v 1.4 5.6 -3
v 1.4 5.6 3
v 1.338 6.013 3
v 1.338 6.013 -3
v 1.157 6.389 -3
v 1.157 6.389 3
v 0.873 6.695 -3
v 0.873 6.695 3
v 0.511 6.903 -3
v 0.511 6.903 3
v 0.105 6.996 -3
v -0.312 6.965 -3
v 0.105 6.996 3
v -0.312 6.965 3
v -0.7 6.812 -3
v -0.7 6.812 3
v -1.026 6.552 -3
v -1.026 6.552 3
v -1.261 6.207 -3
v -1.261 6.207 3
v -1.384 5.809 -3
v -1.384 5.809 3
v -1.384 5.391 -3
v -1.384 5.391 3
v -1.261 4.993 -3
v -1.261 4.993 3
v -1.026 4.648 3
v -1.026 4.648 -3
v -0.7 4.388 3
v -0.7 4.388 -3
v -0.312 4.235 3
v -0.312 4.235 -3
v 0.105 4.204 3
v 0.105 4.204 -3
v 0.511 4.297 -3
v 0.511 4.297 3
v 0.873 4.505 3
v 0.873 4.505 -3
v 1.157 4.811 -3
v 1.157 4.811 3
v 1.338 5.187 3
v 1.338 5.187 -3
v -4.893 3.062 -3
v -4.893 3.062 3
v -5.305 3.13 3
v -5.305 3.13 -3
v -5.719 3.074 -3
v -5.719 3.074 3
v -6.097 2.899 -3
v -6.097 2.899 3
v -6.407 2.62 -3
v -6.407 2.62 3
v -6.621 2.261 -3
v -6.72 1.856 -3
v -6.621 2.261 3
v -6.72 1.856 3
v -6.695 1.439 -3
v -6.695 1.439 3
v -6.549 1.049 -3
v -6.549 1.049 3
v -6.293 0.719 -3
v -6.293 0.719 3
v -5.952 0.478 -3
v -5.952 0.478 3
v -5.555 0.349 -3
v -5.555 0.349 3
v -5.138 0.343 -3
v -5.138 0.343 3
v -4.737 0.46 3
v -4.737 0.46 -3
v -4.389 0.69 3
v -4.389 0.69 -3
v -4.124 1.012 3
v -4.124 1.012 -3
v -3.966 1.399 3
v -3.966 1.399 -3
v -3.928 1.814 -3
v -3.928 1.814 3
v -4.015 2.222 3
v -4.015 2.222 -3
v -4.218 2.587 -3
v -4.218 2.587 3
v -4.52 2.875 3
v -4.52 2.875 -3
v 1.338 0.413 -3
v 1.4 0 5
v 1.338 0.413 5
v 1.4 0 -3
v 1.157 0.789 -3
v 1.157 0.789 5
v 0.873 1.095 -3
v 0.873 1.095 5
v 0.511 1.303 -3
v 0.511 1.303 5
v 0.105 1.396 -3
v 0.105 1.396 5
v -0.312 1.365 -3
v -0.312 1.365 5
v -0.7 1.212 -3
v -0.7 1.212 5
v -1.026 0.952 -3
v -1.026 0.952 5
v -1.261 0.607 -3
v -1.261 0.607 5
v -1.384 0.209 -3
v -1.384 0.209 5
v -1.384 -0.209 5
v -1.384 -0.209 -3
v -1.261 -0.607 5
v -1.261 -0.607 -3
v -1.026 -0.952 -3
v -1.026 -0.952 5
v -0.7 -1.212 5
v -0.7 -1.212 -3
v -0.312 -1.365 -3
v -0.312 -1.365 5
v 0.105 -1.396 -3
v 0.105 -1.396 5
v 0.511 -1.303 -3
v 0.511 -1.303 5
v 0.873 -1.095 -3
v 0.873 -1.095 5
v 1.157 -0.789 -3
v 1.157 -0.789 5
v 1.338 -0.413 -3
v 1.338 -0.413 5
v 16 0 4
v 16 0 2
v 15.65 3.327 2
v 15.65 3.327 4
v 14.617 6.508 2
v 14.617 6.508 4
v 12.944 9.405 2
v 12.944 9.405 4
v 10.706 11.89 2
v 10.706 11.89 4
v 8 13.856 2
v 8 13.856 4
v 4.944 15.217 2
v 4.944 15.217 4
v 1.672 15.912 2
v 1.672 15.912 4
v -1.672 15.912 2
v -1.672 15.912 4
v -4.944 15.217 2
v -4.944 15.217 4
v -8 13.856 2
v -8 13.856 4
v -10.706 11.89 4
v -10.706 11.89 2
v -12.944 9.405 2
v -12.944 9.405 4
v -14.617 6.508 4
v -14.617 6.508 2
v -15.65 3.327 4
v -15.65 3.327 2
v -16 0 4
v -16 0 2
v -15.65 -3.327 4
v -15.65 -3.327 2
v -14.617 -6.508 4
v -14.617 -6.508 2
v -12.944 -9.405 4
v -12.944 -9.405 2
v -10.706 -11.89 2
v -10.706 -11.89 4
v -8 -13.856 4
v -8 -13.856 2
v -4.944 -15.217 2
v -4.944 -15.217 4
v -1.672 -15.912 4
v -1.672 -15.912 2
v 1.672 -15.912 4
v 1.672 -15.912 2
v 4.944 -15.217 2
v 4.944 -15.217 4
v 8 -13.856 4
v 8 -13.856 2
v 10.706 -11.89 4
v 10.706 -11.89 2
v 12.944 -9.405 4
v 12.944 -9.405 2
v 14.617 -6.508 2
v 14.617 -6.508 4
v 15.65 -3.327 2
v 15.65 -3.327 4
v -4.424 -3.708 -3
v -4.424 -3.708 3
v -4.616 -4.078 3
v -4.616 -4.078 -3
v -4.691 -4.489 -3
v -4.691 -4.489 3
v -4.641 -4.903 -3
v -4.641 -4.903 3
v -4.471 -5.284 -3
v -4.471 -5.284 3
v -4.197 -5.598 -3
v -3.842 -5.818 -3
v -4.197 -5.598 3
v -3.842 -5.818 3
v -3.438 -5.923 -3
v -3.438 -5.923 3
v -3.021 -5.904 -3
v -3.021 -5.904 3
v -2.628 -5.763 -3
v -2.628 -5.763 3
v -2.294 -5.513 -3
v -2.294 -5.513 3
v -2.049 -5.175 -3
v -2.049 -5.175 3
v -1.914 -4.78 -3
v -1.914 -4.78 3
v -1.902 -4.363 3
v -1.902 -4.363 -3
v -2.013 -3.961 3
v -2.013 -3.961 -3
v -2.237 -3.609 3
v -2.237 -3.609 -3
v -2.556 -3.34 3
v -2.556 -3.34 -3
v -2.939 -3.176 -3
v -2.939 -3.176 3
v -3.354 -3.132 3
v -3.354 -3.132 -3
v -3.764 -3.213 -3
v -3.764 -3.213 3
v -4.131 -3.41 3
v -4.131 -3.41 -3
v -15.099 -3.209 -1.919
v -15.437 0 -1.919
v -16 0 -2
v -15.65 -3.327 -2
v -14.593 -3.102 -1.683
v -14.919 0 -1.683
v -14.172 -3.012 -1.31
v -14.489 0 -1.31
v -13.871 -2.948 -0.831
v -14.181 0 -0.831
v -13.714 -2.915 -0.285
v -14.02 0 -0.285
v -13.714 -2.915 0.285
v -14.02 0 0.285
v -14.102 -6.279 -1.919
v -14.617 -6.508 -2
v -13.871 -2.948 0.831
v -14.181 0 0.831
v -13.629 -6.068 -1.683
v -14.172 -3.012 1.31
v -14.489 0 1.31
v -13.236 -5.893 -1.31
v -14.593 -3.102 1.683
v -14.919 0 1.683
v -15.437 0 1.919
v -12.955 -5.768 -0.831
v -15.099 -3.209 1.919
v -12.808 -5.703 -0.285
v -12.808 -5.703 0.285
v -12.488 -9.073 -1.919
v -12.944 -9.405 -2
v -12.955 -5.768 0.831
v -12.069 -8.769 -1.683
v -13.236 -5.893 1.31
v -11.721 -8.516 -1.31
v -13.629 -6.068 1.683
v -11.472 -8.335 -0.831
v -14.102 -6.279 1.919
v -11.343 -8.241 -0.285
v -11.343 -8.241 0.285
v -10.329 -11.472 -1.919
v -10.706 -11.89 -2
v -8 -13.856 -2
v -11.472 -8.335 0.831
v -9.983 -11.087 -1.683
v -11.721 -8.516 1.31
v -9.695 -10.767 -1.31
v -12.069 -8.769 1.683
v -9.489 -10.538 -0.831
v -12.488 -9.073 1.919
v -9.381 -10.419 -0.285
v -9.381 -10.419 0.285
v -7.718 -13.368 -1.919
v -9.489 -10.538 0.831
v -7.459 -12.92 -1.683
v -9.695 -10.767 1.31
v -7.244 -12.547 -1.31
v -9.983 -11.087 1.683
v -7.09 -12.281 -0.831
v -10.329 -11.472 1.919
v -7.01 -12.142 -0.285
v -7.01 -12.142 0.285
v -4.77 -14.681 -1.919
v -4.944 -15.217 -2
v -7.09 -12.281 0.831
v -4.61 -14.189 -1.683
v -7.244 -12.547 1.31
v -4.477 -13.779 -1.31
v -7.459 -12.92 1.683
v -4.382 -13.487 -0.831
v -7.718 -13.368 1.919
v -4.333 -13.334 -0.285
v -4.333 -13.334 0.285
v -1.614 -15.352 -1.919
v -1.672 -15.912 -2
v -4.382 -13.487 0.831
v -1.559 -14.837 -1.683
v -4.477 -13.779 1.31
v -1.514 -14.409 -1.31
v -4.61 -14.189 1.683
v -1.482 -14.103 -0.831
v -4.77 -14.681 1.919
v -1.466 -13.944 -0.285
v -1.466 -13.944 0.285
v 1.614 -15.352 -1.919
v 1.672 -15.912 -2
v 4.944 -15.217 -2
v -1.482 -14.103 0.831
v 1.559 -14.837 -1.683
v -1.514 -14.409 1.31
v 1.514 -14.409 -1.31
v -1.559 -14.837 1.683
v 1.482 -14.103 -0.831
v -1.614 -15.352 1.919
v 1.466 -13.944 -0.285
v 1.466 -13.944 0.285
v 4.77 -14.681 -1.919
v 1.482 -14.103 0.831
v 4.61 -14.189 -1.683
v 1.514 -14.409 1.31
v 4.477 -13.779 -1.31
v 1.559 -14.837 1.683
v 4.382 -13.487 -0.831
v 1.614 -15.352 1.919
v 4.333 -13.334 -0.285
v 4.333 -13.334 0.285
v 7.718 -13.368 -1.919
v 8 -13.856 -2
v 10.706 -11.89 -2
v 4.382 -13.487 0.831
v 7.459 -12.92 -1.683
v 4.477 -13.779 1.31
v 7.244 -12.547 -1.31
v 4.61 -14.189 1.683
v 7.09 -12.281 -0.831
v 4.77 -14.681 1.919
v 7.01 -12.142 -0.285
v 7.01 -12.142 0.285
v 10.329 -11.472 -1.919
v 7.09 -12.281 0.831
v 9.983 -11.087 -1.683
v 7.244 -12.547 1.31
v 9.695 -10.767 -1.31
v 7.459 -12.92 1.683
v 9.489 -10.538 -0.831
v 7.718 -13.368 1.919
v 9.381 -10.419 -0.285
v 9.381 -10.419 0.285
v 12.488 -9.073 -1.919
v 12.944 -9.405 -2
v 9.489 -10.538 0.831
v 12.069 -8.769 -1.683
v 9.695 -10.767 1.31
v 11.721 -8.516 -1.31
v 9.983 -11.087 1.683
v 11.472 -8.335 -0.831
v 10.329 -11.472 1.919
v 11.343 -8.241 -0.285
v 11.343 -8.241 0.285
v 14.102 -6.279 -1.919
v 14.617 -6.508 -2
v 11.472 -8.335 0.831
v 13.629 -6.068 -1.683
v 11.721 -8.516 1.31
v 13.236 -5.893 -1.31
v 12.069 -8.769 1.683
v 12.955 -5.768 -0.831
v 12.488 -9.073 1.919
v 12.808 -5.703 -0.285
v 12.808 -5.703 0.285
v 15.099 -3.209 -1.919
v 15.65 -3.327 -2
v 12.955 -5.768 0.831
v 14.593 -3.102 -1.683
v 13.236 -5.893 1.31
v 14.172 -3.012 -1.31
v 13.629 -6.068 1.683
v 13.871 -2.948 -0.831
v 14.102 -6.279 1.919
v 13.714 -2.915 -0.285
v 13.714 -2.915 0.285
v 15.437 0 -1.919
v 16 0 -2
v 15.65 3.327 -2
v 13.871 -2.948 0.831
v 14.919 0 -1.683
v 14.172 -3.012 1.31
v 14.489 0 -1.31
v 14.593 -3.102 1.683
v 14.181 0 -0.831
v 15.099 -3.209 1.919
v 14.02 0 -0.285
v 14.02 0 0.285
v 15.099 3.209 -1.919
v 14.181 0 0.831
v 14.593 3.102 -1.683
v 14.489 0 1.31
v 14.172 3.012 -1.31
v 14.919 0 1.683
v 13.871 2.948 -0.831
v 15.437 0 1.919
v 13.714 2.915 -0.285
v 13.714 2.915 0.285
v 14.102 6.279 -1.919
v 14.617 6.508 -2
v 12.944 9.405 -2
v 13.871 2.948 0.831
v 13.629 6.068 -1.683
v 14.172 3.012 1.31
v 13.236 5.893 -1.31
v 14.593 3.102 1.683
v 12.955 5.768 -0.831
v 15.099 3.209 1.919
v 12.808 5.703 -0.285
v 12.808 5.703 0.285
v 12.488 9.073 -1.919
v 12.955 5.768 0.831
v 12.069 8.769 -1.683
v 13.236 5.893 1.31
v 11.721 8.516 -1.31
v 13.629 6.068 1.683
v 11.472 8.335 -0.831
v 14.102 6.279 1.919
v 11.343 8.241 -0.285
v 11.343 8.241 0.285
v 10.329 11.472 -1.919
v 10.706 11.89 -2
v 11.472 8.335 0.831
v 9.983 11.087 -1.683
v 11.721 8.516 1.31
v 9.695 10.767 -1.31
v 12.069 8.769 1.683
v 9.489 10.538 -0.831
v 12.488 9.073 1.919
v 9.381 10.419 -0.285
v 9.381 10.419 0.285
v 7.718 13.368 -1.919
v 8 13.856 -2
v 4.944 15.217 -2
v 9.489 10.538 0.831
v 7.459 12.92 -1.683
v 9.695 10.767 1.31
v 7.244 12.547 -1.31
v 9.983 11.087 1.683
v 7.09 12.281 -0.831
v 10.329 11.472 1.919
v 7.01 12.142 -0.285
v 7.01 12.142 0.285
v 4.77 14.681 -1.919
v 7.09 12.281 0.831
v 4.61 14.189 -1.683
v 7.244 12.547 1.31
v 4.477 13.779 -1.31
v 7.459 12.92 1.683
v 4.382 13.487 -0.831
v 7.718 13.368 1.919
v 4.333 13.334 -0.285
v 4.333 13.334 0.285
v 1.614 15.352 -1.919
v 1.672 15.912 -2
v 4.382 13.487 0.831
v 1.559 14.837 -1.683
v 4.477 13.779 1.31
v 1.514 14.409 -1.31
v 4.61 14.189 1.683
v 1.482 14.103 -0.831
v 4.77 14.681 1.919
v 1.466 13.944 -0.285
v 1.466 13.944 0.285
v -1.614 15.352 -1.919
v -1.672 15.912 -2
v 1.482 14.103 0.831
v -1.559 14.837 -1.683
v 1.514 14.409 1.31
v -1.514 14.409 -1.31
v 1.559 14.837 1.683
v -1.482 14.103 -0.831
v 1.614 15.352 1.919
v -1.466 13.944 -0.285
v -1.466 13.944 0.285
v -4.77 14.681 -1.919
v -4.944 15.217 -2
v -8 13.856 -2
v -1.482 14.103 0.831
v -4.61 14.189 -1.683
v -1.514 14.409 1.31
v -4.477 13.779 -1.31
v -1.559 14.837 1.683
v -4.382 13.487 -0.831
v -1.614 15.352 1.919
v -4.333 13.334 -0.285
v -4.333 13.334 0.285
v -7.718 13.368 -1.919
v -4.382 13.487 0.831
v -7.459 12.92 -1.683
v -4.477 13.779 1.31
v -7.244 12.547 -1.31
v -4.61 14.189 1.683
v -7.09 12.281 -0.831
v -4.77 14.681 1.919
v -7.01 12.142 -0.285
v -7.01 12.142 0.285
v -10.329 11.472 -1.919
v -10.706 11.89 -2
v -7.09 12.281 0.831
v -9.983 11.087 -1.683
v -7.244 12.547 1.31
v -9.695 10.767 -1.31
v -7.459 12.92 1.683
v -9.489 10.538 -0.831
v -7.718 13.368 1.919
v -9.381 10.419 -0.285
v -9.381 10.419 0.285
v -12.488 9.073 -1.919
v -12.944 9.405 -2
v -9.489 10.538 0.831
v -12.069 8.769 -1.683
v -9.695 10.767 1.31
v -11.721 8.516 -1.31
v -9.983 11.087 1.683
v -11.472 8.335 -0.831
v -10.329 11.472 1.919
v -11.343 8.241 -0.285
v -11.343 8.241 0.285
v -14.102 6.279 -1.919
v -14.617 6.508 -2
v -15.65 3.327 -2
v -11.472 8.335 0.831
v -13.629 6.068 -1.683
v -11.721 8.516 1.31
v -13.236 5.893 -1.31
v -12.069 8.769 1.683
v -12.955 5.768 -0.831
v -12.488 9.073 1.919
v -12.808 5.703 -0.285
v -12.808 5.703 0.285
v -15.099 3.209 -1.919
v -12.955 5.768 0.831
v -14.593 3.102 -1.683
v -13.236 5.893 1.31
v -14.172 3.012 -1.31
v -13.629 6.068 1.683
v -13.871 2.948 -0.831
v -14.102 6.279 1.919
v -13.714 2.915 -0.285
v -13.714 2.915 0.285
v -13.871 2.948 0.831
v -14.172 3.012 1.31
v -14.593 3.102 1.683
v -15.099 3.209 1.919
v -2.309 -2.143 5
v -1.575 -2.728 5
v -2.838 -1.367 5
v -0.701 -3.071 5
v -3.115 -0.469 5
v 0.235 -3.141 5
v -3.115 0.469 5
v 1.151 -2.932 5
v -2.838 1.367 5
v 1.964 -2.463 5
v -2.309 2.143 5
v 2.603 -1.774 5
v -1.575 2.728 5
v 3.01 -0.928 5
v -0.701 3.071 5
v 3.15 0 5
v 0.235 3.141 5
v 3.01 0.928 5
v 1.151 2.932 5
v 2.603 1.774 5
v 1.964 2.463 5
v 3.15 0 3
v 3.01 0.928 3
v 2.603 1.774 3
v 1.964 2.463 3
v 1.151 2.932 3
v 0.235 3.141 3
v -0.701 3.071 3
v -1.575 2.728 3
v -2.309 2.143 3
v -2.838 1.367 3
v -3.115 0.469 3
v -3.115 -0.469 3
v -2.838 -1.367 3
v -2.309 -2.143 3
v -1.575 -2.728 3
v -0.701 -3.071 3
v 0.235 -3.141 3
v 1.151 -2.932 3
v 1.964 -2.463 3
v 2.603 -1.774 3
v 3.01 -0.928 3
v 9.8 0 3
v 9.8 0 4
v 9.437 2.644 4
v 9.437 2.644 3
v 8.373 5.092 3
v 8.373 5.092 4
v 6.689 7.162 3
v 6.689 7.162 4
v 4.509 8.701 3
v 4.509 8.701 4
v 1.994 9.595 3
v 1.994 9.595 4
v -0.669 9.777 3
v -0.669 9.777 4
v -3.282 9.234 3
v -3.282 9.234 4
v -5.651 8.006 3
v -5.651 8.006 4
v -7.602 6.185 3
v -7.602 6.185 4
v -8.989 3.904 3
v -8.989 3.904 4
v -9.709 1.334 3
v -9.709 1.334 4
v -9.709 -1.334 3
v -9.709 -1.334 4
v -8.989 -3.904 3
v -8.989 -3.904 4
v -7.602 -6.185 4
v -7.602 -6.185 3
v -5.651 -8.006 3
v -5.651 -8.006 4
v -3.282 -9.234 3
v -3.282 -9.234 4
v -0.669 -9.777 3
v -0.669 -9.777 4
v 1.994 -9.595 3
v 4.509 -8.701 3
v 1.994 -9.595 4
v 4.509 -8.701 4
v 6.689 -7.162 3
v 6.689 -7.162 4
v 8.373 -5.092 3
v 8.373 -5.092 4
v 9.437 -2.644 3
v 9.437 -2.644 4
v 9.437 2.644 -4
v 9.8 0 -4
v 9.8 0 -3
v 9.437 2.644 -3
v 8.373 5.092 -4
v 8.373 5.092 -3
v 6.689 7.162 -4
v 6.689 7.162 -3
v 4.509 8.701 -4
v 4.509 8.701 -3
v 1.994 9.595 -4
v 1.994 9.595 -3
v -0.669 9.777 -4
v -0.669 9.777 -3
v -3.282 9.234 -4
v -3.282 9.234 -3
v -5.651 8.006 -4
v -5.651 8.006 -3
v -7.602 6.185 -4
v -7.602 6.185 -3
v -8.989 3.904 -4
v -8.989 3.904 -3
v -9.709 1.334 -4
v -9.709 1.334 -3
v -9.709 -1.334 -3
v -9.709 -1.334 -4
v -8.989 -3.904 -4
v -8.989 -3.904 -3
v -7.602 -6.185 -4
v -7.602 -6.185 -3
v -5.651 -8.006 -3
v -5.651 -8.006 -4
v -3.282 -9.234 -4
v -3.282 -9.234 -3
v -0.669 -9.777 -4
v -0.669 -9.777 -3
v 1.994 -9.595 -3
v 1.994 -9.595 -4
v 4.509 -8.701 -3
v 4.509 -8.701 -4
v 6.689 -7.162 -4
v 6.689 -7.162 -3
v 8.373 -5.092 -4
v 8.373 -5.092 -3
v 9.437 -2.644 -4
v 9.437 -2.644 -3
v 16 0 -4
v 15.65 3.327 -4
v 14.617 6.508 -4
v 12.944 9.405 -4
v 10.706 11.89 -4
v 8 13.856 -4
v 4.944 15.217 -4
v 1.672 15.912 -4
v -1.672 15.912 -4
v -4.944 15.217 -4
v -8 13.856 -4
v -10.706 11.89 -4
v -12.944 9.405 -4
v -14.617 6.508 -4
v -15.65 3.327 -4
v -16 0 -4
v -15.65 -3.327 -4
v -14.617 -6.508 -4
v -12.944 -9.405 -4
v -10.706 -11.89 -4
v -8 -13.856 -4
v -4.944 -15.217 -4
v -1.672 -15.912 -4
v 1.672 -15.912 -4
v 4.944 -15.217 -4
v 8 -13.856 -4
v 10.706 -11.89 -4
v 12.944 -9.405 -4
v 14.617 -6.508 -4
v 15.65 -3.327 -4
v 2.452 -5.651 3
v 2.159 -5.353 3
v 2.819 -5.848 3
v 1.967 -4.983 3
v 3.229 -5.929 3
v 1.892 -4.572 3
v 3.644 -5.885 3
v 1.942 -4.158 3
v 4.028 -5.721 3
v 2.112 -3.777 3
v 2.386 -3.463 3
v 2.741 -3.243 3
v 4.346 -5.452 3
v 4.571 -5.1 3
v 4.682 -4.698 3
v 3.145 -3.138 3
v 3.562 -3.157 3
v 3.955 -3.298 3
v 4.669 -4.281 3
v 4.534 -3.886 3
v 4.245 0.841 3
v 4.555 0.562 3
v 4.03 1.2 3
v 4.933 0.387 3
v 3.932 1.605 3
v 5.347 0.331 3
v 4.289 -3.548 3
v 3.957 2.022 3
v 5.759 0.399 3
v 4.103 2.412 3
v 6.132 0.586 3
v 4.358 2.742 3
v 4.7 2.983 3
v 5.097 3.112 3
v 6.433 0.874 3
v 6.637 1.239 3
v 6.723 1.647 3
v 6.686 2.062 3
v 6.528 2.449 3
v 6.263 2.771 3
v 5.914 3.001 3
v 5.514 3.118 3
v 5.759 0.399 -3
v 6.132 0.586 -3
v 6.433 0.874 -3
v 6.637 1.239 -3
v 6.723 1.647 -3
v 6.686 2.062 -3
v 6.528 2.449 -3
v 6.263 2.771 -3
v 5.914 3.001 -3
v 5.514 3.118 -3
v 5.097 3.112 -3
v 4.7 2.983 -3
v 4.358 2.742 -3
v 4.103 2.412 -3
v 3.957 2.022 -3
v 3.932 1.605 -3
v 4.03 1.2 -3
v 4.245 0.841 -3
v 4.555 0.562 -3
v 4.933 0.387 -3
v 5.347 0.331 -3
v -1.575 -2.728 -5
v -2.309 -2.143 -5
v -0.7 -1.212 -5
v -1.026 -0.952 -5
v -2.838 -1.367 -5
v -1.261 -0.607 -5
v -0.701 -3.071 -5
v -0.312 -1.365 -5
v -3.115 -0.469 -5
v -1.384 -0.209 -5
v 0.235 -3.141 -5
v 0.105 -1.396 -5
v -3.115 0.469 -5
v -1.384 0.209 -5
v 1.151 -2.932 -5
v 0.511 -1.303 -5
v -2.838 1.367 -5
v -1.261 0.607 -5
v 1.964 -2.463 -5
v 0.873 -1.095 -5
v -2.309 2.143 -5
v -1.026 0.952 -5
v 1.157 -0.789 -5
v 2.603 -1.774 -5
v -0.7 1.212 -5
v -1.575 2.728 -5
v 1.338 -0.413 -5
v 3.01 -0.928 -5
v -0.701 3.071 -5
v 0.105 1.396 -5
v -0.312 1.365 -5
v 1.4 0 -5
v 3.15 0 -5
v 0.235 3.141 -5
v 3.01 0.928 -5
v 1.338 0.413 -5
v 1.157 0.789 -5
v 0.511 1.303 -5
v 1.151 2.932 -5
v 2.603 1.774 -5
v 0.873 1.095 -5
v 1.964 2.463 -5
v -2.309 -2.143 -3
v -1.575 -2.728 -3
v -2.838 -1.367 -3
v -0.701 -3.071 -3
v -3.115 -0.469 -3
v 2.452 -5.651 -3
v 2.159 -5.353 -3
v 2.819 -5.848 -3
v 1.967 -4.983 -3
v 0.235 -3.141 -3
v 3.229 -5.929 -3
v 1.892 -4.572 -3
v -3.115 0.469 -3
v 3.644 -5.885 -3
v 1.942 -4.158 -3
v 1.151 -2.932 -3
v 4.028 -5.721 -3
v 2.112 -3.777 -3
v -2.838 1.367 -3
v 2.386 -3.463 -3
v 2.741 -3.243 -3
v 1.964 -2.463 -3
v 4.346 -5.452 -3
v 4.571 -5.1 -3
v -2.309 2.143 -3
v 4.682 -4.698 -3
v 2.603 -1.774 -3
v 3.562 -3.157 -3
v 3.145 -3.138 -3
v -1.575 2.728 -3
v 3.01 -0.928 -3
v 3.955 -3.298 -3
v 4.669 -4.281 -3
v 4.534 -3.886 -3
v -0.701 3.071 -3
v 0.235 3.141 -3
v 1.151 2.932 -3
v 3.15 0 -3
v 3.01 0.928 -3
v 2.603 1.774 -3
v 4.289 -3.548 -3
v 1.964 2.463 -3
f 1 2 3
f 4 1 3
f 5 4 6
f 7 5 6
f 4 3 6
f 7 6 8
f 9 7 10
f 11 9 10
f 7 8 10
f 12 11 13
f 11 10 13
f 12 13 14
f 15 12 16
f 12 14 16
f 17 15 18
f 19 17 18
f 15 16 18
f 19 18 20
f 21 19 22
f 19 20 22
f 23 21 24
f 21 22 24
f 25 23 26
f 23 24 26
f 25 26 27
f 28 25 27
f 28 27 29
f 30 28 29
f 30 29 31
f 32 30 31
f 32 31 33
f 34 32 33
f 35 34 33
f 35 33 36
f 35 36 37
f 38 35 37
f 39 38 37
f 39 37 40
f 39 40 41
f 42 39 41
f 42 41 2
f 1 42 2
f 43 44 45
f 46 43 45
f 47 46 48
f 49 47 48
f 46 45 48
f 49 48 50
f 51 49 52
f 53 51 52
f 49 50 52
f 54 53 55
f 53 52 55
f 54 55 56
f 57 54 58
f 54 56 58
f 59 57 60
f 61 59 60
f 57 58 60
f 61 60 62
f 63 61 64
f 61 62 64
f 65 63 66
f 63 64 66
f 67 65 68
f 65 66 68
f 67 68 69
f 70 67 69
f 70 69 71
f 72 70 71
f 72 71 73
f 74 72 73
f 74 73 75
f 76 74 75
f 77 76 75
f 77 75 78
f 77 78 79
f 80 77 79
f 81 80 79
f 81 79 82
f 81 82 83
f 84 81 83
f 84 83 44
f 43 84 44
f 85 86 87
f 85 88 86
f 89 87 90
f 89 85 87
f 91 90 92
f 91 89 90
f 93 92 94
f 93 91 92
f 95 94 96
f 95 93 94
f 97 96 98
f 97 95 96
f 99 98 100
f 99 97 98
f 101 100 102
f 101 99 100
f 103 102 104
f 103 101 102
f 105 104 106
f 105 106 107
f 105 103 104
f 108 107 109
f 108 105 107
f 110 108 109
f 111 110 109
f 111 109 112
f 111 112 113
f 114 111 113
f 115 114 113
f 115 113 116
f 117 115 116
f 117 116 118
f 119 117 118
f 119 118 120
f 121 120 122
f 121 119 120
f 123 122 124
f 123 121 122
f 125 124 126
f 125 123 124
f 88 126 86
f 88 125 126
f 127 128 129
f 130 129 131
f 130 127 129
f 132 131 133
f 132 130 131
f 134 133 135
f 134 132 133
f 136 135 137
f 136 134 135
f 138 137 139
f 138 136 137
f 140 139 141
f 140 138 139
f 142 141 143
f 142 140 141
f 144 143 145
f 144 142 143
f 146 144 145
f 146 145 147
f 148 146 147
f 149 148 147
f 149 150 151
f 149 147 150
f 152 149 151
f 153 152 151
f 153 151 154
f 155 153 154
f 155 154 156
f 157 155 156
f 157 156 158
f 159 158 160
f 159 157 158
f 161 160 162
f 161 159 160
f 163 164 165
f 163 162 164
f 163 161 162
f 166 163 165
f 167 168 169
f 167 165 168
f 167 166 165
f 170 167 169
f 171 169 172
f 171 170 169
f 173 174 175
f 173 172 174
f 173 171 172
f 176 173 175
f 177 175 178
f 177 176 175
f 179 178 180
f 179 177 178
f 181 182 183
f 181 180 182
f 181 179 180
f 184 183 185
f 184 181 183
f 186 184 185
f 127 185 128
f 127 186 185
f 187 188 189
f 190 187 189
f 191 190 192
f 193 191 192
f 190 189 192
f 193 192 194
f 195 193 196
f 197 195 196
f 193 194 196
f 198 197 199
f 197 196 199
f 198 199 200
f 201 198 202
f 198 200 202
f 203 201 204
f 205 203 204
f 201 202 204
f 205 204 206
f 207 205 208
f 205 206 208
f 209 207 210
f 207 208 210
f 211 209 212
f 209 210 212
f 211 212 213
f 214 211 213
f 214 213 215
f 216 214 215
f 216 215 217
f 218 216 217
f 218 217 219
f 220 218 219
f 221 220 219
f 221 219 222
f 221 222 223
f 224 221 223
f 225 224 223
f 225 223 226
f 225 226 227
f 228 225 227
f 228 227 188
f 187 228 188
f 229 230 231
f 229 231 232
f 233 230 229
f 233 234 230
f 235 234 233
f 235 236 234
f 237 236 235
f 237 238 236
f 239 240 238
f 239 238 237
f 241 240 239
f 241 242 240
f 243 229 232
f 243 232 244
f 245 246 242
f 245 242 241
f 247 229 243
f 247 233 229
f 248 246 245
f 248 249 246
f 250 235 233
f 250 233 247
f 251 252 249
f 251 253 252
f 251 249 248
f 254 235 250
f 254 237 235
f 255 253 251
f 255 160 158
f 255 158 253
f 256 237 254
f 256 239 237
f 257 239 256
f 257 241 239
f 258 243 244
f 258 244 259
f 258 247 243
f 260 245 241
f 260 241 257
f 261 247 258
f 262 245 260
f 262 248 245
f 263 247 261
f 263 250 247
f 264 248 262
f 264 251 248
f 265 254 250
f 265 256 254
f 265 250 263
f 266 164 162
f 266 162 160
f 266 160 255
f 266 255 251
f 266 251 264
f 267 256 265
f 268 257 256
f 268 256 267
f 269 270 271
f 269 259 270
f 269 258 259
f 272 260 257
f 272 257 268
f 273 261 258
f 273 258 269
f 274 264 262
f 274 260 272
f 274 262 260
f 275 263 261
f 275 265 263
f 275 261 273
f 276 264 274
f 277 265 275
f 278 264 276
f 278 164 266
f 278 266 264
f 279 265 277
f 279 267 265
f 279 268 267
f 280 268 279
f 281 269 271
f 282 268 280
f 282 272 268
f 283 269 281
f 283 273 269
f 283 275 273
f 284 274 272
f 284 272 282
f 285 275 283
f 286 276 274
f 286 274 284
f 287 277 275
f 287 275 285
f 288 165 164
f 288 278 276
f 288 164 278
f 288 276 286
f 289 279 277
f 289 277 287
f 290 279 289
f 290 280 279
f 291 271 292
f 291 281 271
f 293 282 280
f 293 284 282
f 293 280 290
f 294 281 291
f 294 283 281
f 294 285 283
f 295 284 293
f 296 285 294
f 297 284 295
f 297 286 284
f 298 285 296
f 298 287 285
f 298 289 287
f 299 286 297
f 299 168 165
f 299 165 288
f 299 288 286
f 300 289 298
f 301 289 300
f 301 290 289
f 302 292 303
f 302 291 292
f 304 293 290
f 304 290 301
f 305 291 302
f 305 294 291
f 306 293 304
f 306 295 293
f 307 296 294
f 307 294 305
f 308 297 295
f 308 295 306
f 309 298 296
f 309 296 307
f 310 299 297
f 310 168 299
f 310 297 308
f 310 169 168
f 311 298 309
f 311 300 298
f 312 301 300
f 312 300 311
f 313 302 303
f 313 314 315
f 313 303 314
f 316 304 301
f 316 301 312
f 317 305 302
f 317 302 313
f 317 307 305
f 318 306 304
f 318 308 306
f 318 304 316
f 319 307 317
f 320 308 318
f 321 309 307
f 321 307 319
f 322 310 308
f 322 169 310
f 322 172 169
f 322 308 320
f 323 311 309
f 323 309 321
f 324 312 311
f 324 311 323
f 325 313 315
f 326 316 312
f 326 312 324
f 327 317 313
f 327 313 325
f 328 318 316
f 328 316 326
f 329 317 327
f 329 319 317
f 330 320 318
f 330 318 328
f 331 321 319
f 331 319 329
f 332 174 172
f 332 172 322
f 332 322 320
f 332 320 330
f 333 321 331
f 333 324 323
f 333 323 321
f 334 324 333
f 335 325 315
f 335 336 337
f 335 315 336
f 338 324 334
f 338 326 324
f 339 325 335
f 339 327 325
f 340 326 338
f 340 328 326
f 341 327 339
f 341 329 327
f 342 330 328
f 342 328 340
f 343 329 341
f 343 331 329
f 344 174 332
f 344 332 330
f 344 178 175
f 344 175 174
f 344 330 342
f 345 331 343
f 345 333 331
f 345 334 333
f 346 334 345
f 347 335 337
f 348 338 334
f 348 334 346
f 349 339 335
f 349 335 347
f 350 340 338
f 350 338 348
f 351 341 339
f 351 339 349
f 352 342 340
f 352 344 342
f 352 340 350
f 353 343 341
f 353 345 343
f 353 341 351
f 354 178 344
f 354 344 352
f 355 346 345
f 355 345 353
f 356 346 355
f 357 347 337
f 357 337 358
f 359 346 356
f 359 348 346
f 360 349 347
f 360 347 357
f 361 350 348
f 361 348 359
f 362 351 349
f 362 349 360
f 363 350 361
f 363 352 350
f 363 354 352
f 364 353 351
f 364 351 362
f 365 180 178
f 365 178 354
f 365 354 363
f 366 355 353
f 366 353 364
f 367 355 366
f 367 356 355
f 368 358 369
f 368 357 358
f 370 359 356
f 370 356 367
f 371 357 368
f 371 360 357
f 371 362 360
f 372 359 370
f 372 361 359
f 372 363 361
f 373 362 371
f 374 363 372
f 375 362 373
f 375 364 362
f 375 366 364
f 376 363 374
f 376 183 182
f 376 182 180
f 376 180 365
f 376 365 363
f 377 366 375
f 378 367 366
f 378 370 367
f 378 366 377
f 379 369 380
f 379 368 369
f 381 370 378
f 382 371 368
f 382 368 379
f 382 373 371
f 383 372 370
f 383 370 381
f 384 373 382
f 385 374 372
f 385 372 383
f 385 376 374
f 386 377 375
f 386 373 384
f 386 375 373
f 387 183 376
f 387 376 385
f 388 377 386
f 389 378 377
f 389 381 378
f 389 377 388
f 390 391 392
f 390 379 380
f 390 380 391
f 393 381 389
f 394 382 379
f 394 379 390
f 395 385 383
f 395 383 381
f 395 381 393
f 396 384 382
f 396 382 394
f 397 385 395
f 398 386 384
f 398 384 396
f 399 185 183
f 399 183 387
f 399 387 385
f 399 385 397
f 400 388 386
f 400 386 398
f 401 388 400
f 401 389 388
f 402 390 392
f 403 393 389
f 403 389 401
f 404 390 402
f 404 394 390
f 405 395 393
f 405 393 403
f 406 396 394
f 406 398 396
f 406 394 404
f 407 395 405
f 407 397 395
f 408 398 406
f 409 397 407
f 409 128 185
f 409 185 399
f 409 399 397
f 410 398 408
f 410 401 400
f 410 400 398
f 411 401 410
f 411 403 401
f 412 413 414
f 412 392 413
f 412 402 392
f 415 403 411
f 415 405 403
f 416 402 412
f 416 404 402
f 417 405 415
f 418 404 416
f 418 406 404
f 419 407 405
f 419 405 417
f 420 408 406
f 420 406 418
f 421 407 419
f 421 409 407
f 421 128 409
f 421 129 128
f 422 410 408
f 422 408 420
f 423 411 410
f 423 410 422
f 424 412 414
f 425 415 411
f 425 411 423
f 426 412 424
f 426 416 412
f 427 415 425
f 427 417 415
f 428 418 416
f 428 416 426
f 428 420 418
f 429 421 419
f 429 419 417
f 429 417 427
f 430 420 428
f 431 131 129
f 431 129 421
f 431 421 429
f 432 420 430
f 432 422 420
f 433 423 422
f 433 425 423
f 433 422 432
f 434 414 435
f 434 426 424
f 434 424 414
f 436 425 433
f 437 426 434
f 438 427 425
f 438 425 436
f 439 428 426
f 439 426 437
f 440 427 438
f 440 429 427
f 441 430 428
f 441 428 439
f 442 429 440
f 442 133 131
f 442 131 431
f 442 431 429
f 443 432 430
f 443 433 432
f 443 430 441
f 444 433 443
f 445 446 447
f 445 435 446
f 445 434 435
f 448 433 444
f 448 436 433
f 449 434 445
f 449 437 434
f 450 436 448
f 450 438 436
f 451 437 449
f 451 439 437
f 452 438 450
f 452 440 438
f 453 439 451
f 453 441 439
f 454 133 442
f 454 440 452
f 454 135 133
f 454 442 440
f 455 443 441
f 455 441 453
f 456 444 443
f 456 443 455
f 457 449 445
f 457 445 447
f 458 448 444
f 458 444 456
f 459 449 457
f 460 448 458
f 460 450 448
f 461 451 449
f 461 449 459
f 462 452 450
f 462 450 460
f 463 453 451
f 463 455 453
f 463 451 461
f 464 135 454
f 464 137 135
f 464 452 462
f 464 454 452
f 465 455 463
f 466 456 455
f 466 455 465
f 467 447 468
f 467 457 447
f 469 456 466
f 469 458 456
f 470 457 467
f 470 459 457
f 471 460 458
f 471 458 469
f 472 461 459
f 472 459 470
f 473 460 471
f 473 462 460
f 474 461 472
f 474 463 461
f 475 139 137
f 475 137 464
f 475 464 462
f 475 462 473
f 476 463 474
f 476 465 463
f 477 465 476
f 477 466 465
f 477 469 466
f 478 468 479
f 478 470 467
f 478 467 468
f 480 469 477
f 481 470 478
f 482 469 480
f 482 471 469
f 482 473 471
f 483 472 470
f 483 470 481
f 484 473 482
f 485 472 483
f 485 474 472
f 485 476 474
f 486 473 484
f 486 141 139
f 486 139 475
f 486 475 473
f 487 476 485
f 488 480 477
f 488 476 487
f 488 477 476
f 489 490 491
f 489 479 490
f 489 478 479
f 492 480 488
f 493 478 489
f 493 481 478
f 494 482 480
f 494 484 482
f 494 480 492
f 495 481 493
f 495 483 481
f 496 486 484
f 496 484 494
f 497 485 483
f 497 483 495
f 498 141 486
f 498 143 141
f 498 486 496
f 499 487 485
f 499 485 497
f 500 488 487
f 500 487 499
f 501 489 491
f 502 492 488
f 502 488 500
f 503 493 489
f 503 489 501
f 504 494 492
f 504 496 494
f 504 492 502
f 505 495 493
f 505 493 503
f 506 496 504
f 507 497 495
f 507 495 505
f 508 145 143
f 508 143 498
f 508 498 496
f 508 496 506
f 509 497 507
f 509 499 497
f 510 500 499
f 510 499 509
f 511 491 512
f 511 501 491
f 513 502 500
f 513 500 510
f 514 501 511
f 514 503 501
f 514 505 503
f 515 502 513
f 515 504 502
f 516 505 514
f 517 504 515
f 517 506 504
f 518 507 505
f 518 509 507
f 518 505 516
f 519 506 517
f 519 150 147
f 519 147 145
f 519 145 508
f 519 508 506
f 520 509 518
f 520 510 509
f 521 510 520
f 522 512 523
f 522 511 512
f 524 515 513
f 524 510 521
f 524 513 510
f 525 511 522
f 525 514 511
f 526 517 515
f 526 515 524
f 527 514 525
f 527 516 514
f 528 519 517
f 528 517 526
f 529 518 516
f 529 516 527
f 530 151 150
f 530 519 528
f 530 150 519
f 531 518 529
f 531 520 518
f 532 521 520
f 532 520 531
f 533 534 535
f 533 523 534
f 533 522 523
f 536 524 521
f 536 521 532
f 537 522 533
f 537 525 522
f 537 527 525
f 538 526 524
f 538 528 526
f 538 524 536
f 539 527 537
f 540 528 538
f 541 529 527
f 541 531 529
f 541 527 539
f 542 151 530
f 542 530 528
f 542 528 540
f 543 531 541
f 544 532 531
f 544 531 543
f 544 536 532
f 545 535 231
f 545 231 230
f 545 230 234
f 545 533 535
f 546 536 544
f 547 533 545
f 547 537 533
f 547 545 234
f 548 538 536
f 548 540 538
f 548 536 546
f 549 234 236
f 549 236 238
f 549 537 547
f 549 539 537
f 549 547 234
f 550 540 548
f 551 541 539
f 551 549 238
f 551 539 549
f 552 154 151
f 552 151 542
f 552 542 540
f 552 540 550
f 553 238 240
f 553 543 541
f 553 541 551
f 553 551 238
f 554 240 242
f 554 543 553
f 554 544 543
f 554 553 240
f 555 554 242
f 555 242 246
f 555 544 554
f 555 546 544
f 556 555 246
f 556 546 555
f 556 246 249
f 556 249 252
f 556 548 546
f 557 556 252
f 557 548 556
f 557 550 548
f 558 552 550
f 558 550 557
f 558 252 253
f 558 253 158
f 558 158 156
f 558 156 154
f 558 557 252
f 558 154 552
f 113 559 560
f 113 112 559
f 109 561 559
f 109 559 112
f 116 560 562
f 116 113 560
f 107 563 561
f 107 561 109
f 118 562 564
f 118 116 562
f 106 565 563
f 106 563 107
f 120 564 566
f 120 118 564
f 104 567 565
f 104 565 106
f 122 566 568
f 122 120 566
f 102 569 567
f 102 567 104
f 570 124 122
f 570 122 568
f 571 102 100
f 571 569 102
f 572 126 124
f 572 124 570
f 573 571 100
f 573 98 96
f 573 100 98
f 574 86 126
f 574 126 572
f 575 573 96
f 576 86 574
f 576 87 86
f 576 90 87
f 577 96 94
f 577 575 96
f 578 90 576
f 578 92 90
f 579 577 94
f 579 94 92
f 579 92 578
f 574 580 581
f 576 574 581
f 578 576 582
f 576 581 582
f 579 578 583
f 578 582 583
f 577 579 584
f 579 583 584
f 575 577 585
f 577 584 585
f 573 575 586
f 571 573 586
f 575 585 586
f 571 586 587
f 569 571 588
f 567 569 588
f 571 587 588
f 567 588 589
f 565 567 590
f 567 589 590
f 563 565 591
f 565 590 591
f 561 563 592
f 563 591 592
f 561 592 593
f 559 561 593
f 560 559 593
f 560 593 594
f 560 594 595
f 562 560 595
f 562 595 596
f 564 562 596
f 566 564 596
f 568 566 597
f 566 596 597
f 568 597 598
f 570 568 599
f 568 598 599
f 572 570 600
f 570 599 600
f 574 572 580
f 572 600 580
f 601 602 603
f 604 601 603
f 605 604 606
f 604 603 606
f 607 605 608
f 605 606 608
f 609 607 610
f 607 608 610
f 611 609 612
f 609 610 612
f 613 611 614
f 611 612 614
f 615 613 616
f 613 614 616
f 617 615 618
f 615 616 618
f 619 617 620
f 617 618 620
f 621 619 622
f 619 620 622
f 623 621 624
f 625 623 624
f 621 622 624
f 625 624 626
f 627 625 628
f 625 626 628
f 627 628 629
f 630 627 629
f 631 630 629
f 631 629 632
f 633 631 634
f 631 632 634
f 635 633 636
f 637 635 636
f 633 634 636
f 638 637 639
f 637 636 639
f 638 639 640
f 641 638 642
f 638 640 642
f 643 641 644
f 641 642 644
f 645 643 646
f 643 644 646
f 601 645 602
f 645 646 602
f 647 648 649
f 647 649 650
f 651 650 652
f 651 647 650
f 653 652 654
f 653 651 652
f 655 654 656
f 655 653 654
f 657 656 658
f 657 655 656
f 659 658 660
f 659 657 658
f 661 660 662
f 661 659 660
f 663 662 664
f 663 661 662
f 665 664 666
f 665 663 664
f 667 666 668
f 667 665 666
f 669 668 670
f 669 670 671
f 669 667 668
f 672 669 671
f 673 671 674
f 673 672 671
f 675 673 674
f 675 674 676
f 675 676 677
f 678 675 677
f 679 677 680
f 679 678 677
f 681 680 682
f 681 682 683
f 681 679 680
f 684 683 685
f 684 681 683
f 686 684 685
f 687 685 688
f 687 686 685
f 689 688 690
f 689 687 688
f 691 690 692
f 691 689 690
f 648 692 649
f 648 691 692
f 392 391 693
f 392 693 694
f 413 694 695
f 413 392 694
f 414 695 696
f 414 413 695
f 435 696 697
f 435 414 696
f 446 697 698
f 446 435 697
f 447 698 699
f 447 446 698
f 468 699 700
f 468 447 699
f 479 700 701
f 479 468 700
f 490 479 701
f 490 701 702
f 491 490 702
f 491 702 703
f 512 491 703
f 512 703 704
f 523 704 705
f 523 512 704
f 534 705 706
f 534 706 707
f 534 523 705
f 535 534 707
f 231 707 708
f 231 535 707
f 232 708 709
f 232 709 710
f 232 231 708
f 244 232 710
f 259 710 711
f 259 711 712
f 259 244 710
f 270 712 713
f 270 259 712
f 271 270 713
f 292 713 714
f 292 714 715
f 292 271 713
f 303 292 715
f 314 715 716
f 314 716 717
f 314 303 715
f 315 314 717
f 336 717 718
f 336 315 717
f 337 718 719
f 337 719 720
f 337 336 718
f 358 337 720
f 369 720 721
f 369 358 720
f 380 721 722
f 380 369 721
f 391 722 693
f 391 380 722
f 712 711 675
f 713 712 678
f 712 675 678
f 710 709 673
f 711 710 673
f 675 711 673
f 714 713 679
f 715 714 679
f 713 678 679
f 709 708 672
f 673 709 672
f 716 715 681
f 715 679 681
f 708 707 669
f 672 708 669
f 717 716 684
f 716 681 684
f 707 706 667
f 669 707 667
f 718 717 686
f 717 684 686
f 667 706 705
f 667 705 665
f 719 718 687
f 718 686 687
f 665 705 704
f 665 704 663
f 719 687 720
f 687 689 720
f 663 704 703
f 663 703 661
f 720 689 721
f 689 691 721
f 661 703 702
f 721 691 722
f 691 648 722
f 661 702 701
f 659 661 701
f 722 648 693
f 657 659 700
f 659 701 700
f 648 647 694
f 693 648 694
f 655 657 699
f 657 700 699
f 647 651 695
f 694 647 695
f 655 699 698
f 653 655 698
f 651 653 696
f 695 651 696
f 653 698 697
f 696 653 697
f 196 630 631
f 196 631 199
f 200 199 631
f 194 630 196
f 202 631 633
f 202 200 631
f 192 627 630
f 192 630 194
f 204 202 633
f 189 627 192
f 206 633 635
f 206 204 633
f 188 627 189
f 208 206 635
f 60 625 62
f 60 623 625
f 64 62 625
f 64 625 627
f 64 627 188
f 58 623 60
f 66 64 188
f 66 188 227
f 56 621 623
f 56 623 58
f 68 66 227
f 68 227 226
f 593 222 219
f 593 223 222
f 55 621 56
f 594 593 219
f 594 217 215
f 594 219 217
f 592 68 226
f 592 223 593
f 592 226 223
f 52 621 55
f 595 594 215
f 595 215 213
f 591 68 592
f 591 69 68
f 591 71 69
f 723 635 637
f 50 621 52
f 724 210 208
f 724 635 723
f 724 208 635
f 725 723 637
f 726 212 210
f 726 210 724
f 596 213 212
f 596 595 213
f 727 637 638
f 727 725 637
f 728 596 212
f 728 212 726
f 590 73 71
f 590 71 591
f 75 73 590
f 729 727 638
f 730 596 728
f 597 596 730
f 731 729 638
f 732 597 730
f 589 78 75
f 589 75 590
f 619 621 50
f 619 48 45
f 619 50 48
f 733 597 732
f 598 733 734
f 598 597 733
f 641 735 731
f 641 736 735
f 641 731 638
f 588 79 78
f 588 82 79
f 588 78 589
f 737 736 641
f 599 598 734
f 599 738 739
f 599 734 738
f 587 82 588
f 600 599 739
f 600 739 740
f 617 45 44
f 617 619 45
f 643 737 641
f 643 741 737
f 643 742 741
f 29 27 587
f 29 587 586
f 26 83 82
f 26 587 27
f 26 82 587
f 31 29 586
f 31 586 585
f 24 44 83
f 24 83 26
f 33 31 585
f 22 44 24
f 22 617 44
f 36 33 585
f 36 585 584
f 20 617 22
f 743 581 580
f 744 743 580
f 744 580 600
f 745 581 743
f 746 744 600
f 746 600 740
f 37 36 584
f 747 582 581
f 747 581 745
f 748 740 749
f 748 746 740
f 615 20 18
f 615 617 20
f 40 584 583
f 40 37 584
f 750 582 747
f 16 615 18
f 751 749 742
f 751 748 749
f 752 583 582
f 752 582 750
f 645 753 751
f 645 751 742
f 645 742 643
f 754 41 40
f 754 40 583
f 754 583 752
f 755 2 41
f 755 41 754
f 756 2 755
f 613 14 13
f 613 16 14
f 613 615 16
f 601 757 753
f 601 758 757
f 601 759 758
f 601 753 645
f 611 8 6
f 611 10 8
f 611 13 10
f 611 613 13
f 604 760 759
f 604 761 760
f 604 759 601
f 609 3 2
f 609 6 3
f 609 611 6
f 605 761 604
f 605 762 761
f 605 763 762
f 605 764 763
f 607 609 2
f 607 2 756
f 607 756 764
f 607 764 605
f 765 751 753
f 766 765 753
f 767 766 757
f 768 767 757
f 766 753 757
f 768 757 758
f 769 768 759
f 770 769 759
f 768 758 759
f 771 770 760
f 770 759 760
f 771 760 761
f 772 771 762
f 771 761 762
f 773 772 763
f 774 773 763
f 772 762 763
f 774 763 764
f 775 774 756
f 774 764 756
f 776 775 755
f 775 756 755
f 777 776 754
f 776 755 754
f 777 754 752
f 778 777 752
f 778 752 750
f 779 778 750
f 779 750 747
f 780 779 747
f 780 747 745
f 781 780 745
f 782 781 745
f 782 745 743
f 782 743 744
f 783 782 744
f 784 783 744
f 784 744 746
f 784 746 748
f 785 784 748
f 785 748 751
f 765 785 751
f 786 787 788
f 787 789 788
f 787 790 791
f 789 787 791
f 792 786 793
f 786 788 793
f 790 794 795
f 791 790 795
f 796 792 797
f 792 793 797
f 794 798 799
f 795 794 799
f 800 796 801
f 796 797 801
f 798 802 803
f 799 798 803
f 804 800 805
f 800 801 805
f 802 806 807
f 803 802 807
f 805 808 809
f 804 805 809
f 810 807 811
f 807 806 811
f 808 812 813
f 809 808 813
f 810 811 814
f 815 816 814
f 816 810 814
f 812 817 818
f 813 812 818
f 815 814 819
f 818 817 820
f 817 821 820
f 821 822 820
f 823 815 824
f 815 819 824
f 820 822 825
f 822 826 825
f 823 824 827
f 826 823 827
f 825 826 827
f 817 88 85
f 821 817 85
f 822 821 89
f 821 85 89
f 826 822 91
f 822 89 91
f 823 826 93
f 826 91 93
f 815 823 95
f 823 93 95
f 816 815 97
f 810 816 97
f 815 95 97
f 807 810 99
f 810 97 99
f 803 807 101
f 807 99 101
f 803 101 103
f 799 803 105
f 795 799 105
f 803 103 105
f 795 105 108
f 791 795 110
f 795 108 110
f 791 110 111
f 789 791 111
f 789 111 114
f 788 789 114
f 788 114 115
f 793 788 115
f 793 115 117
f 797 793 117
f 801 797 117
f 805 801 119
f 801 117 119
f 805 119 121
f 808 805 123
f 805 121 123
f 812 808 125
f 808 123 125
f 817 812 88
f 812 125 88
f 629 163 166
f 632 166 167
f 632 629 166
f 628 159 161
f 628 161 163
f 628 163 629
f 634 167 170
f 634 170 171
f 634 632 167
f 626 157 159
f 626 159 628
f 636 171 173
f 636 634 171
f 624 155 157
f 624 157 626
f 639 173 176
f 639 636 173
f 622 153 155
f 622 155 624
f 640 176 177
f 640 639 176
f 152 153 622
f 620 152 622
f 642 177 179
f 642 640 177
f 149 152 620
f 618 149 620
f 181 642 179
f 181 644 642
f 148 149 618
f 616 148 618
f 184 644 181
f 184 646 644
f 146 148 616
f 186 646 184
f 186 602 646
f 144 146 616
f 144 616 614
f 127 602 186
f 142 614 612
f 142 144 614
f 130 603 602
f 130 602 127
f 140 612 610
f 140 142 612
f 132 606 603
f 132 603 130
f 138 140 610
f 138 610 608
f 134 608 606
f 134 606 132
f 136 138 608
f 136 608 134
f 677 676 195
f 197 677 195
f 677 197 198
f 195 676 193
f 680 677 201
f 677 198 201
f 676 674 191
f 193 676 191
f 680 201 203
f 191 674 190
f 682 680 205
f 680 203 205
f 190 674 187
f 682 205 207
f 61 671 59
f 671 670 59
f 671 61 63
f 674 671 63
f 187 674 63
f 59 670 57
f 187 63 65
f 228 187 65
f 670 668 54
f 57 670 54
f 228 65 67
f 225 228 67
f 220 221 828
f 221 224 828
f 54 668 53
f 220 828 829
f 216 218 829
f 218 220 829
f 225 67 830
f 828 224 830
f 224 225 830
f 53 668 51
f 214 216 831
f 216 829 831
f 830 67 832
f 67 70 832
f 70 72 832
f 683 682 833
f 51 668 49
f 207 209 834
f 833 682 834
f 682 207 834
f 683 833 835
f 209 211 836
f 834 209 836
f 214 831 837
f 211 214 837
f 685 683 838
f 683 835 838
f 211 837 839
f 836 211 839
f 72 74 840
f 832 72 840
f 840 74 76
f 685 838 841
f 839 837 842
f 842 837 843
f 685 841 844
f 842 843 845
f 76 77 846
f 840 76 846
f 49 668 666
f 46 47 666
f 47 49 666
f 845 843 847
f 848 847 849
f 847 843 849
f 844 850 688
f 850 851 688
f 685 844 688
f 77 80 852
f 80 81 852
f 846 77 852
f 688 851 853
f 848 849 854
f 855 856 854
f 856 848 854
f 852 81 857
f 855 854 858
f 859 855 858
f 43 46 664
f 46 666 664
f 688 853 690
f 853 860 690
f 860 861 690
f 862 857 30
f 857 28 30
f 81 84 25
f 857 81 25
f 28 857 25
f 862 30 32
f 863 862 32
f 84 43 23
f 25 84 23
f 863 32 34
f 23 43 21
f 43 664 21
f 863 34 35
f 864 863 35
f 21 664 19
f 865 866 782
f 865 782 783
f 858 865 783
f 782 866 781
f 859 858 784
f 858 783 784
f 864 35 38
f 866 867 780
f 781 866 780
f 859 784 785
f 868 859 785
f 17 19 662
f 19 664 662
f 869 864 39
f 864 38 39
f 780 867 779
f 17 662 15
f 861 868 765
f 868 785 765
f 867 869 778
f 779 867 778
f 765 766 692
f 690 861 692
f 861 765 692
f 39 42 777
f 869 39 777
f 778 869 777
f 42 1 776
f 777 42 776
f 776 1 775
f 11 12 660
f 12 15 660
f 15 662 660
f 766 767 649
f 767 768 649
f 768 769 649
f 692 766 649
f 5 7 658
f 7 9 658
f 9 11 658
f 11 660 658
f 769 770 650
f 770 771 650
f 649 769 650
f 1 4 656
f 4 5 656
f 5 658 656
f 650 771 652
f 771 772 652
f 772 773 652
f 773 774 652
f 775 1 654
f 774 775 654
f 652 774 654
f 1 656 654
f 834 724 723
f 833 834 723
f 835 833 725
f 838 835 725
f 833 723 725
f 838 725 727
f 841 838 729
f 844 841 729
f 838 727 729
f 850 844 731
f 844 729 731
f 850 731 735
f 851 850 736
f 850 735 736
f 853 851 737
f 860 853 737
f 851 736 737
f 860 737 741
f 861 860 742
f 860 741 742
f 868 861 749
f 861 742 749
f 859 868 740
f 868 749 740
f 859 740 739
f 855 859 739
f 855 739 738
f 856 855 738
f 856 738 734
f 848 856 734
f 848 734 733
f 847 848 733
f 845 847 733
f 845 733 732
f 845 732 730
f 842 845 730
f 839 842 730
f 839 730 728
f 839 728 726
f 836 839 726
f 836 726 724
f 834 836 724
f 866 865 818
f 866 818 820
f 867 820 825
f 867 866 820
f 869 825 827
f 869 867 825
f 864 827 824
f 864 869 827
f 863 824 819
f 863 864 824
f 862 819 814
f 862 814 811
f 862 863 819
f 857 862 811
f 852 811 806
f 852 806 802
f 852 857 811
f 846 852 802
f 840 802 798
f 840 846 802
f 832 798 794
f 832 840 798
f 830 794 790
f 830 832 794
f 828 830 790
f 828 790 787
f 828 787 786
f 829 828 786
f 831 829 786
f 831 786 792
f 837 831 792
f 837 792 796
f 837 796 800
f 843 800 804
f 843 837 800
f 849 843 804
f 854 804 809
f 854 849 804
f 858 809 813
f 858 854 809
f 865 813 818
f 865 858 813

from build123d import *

# Parameters (mm, degrees)
SKETCH2_R           = 16
SKETCH2_R_2         = 1.4
BOSS_EXTRUDE1_DEPTH = 4
SKETCH3_R           = 9.8
CUT_EXTRUDE1_DEPTH  = 1
SKETCH6_R           = 3.15
SKETCH6_R_2         = 1.4
BOSS_EXTRUDE2_DEPTH = 2
SKETCH4_R           = 1.4
CUT_EXTRUDE2_DEPTH  = 25
CIRPATTERN1_COUNT   = 5
SKETCH5_R           = 2


with BuildPart() as part:
    # Sketch2 → Boss-Extrude1 (new, symmetric)
    with BuildSketch(Plane.XY):
        Circle(SKETCH2_R)
        Circle(SKETCH2_R_2, mode=Mode.SUBTRACT)
    extrude(amount=BOSS_EXTRUDE1_DEPTH, both=True)

    # Sketch3 → Cut-Extrude1 (cut)
    with BuildSketch(Plane.XY.offset(4)):
        Circle(SKETCH3_R)
    cut_extrude1 = extrude(amount=-CUT_EXTRUDE1_DEPTH, mode=Mode.SUBTRACT)

    # Sketch6 → Boss-Extrude2 (add)
    with BuildSketch(Plane.XY.offset(3)):
        Circle(SKETCH6_R)
        Circle(SKETCH6_R_2, mode=Mode.SUBTRACT)
    boss_extrude2 = extrude(amount=BOSS_EXTRUDE2_DEPTH)

    # Mirror1: Cut-Extrude1, Boss-Extrude2 across plane
    add(cut_extrude1.mirror(Plane.XY), mode=Mode.SUBTRACT)
    add(boss_extrude2.mirror(Plane.XY))

    # Sketch4 → Cut-Extrude2 (cut, through all)
    with BuildSketch(Plane.XY.offset(3)):
        with Locations((0, 5.6)):
            Circle(SKETCH4_R)
    cut_extrude2 = extrude(amount=-CUT_EXTRUDE2_DEPTH, mode=Mode.SUBTRACT)

    # CirPattern1: Cut-Extrude2 ×5 about axis
    cirpattern1_axis = Axis((0, 0, 0), (0, 0, 1))
    for i in range(1, CIRPATTERN1_COUNT):
        add(cut_extrude2.rotate(cirpattern1_axis, i * 360 / CIRPATTERN1_COUNT), mode=Mode.SUBTRACT)

    # Sketch5 → Cut-Revolve1 (revolve, cut)
    with BuildSketch(Plane(origin=(0, 0, 0), x_dir=(1, 0, 0), z_dir=(0, 1, 0)), mode=Mode.PRIVATE) as cut_revolve1_sk:
        with Locations((16, 0)):
            Circle(SKETCH5_R)
    revolve(cut_revolve1_sk.sketch.rotate(Axis((0, 0, -19.267509915), (0, 0, 1)), 180), axis=Axis((0, 0, -19.267509915), (0, 0, 1)), mode=Mode.SUBTRACT)


solid = part.part
